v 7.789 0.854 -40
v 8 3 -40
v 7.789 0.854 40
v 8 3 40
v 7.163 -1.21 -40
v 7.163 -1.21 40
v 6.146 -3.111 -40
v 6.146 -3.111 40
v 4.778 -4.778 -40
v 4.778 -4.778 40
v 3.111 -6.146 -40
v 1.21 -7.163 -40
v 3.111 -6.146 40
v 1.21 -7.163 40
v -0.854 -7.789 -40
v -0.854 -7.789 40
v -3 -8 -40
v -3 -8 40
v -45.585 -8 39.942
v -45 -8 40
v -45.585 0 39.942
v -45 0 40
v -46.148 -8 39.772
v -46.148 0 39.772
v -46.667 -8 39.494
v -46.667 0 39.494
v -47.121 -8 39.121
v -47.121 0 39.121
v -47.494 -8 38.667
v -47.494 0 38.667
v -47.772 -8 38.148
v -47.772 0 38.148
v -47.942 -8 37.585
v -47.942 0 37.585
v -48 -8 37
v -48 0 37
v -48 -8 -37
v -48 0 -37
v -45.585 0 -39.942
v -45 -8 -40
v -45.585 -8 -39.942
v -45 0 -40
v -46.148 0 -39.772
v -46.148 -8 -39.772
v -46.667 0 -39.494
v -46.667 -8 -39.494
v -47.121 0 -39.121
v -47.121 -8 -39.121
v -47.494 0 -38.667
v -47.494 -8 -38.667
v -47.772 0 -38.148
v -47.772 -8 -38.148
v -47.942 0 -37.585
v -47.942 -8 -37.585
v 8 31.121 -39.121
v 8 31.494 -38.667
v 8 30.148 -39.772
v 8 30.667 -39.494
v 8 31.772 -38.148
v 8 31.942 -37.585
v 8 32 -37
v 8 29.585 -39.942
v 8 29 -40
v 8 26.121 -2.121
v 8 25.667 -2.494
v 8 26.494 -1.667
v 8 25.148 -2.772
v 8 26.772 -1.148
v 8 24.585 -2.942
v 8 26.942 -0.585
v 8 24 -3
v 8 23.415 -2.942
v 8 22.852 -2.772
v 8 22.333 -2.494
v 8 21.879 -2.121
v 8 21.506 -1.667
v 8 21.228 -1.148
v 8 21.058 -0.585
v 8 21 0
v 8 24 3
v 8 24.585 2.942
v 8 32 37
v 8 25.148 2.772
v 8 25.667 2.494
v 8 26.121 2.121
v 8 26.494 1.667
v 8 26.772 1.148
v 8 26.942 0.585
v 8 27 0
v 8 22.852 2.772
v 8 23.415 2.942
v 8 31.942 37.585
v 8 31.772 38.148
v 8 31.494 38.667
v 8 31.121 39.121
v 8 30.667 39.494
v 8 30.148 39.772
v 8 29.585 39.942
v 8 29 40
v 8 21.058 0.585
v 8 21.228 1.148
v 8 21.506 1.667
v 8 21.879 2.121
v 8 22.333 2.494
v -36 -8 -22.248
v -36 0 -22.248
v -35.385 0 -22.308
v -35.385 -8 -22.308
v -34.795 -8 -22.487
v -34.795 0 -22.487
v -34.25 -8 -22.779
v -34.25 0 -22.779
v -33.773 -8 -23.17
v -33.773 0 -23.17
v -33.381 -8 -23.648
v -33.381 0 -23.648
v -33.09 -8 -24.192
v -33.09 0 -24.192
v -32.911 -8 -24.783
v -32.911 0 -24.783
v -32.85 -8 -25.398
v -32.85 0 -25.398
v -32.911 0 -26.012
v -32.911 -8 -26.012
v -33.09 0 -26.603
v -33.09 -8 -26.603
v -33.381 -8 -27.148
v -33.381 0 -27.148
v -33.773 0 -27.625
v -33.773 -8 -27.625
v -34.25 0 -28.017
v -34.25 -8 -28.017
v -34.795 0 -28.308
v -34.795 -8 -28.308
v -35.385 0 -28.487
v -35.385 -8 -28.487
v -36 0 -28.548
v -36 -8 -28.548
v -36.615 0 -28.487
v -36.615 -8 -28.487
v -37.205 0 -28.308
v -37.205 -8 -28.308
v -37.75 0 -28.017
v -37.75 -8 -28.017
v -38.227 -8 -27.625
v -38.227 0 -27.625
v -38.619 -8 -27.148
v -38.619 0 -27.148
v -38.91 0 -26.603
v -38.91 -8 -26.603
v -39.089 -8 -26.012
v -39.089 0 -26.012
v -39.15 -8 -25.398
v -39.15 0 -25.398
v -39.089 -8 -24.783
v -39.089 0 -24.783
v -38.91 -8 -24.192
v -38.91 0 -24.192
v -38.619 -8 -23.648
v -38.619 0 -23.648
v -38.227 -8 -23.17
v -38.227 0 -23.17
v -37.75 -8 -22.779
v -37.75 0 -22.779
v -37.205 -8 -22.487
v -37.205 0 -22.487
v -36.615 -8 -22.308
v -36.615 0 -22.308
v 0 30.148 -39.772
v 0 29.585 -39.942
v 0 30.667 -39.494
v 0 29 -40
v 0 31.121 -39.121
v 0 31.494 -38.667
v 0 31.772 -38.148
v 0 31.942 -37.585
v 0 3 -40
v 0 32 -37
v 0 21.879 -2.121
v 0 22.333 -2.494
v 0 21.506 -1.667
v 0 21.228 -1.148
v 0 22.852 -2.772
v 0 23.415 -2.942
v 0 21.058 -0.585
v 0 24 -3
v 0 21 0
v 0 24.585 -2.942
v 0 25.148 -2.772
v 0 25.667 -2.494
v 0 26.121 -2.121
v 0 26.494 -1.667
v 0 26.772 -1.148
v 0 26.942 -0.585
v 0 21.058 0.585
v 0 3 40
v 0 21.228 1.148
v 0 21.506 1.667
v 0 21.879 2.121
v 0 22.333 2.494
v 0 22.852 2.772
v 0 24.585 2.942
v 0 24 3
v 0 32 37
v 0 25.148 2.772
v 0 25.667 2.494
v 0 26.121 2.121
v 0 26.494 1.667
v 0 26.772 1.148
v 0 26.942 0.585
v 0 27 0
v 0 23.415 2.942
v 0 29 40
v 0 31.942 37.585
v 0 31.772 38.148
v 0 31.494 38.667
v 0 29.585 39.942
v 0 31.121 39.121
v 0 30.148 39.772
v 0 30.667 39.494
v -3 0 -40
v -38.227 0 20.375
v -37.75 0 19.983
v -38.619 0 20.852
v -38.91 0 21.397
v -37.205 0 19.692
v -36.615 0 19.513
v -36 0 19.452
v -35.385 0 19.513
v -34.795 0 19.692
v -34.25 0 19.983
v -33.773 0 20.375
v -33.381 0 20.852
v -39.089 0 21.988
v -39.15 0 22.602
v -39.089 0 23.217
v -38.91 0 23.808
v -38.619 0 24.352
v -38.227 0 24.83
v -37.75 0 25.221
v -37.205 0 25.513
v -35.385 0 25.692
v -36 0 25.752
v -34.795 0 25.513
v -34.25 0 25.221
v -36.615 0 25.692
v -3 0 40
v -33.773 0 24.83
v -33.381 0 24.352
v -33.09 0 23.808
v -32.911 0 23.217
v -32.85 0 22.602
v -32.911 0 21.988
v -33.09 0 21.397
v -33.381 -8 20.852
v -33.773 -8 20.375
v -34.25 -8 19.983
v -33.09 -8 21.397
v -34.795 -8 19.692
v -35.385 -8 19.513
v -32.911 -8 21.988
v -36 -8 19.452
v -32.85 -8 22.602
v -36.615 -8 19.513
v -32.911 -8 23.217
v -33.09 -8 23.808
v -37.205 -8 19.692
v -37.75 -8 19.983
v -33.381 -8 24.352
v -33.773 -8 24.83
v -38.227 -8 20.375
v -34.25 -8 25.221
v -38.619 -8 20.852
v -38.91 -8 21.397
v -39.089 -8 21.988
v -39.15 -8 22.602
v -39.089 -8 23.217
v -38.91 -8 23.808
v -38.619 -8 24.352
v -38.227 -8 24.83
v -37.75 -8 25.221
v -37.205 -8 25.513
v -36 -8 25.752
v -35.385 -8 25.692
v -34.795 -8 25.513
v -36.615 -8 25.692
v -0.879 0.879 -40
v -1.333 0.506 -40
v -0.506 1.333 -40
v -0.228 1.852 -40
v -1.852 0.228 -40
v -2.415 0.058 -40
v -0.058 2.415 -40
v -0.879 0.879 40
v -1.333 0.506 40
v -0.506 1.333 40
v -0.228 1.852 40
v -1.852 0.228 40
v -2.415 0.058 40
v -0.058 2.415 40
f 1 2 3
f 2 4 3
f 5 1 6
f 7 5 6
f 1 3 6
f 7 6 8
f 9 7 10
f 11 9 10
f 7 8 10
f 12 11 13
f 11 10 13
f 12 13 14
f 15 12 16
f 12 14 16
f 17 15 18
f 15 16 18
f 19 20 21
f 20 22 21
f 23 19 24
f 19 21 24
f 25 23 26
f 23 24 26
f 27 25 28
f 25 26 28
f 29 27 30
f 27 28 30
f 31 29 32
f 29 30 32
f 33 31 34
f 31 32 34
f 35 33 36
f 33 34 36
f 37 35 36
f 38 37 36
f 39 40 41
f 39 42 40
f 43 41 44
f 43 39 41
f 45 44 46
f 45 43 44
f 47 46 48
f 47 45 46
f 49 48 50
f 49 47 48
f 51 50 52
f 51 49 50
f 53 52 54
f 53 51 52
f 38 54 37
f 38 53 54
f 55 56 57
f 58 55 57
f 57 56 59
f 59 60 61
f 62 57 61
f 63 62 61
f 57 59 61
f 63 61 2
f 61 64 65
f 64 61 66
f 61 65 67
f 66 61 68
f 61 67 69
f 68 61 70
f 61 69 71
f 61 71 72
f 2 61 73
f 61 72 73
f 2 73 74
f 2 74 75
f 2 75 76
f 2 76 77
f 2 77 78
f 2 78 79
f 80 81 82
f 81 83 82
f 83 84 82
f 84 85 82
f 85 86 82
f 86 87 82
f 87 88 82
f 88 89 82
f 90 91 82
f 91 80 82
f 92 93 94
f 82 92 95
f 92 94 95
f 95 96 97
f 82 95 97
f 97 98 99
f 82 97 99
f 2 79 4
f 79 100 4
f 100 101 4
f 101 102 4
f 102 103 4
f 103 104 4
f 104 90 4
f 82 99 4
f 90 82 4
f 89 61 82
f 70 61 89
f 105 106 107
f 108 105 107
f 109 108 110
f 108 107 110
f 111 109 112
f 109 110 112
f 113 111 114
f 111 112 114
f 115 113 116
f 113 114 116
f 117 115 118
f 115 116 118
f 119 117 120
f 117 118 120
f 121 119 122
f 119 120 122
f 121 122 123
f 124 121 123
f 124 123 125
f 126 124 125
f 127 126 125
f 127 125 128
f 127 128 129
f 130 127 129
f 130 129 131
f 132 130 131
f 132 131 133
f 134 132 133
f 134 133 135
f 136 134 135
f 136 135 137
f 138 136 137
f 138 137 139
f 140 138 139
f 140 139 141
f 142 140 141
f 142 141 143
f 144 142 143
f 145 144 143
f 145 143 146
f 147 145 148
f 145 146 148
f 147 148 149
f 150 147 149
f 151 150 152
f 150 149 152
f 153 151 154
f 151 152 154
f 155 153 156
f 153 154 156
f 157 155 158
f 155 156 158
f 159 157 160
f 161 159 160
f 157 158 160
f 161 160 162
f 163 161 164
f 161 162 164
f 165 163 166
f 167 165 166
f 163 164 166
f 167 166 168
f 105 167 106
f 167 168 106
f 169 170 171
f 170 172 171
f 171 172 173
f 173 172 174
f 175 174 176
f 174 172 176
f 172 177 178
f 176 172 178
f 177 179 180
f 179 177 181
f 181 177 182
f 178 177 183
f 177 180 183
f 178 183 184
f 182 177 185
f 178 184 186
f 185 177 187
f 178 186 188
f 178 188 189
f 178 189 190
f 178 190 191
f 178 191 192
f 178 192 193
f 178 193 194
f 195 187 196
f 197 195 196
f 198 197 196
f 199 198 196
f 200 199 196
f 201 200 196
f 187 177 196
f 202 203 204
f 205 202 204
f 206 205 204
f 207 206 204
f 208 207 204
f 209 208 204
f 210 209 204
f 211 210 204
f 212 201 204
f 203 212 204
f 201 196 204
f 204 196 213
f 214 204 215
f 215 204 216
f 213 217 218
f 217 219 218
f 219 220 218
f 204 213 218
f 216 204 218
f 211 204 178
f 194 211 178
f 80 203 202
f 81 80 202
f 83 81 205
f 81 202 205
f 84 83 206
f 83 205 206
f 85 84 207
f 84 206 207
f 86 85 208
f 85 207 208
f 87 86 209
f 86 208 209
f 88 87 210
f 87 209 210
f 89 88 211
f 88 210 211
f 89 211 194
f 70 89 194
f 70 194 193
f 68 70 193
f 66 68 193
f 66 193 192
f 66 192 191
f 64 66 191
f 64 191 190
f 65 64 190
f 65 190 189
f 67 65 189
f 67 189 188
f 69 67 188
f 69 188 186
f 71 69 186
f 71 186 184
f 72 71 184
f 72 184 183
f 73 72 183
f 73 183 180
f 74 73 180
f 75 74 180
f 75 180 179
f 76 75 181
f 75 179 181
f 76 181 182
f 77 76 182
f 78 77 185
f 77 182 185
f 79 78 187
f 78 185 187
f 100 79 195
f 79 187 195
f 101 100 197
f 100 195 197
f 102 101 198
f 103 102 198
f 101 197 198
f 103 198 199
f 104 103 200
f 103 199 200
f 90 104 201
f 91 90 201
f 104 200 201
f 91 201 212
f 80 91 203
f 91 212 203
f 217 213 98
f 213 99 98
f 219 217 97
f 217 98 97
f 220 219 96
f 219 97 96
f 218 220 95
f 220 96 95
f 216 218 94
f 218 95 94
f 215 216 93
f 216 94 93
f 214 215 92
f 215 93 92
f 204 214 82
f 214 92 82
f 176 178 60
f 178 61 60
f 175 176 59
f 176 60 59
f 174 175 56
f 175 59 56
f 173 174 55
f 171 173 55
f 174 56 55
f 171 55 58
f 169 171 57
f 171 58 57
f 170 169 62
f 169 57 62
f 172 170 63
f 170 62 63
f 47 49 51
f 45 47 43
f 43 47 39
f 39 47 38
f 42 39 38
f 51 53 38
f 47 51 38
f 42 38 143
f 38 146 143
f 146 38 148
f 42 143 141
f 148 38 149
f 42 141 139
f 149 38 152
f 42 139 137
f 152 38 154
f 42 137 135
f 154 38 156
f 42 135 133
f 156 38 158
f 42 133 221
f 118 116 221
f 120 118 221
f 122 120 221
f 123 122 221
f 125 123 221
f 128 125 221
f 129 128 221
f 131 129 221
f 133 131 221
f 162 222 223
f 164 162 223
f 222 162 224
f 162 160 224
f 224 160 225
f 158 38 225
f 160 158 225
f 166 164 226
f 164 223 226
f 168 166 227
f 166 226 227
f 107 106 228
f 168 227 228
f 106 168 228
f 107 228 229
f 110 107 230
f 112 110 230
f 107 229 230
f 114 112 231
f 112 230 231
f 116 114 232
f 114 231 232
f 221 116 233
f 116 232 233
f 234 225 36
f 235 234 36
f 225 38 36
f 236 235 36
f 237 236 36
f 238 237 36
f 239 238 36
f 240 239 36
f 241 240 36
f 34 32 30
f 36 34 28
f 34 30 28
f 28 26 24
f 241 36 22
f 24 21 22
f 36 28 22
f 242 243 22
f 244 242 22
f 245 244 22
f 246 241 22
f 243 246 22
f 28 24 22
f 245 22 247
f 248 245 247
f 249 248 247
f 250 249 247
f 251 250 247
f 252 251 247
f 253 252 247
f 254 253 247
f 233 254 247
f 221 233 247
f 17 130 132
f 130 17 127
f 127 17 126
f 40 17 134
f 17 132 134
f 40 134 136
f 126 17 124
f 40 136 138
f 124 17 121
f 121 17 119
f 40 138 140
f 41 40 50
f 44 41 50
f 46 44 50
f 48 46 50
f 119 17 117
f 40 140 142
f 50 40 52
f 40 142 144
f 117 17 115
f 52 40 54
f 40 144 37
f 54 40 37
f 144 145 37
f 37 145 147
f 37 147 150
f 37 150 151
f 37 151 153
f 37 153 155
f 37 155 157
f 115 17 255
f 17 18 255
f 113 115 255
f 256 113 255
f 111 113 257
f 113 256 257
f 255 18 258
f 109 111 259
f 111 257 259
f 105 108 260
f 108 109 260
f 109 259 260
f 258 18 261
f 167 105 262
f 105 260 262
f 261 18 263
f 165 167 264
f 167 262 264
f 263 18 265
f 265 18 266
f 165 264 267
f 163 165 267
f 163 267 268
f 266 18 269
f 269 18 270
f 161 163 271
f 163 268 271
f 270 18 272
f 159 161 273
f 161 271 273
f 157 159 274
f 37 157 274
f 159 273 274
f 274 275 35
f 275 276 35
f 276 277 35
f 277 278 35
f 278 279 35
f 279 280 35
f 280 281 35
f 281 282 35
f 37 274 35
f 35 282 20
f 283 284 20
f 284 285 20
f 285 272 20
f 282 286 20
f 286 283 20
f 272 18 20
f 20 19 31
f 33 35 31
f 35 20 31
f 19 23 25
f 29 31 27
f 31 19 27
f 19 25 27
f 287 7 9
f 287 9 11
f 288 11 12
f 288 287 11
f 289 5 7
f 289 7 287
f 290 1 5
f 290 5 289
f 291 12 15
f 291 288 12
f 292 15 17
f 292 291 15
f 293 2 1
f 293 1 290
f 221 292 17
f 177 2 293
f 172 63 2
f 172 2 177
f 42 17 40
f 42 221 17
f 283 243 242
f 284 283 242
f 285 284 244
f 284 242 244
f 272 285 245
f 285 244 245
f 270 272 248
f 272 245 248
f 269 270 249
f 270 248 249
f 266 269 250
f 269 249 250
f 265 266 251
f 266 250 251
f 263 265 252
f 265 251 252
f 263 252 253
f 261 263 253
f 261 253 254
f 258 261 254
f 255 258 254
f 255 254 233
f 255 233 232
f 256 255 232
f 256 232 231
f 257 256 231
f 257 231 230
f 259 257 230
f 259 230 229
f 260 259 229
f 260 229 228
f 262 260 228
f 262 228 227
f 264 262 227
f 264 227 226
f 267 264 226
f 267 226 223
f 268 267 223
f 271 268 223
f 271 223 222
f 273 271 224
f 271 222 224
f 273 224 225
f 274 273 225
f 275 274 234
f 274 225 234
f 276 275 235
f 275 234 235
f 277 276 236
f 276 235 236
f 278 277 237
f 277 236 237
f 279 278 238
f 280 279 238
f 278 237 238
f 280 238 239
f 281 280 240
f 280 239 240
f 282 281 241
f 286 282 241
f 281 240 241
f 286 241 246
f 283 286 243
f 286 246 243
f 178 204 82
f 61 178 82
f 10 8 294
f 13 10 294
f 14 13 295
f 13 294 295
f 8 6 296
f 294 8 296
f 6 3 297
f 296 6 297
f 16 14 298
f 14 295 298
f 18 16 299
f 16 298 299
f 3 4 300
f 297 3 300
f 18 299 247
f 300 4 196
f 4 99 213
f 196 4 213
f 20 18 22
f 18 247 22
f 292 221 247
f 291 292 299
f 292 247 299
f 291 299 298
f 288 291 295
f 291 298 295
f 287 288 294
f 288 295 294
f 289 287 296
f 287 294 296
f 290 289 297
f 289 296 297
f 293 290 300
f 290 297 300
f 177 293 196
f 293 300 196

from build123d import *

# Parameters (mm, degrees)
BASE_FLANGE1_DEPTH = 40
FILLET1_R          = 3
SKETCH6_R          = 3.15
CUT_EXTRUDE1_DEPTH = 10
SKETCH7_R          = 3
CUT_EXTRUDE2_DEPTH = 10


# Sheet-metal steps are written as plain solids
with BuildPart() as part:
    # Sketch1 → Base-Flange1 (new, symmetric)
    with BuildSketch(Plane.XY):
        with BuildLine():
            Line((-48, 0), (-3, 0))
            ThreePointArc((-3, 0), (-0.878679656, 0.878679656), (0, 3))
            Line((0, 3), (0, 32))
            Line((0, 32), (8, 32))
            Line((8, 32), (8, 3))
            ThreePointArc((8, 3), (4.778174593, -4.778174593), (-3, -8))
            Line((-3, -8), (-48, -8))
            Line((-48, -8), (-48, 0))
        make_face()
    extrude(amount=BASE_FLANGE1_DEPTH, both=True)

    # Fillet1
    fillet1_edges = [part.edges().sort_by_distance(p)[0] for p in [
        (-48, -4, 40),
        (-48, -4, -40),
        (4, 32, 40),
        (4, 32, -40),
    ]]
    fillet(fillet1_edges, radius=FILLET1_R)

    # Sketch6 → Cut-Extrude1 (cut)
    with BuildSketch(Plane(origin=(0, 0, 0), x_dir=(1, 0, 0), z_dir=(0, 1, 0))):
        with Locations(Location((-36, 25.397681591, 0), (0, 0, 270))):
            Circle(SKETCH6_R)
        with Locations(Location((-36, -22.602318409, 0), (0, 0, 270))):
            Circle(SKETCH6_R)
    extrude(amount=-CUT_EXTRUDE1_DEPTH, mode=Mode.SUBTRACT)

    # Sketch7 → Cut-Extrude2 (cut)
    with BuildSketch(Plane.ZY):
        with Locations((0, 24)):
            Circle(SKETCH7_R)
    extrude(amount=-CUT_EXTRUDE2_DEPTH, mode=Mode.SUBTRACT)


solid = part.part
